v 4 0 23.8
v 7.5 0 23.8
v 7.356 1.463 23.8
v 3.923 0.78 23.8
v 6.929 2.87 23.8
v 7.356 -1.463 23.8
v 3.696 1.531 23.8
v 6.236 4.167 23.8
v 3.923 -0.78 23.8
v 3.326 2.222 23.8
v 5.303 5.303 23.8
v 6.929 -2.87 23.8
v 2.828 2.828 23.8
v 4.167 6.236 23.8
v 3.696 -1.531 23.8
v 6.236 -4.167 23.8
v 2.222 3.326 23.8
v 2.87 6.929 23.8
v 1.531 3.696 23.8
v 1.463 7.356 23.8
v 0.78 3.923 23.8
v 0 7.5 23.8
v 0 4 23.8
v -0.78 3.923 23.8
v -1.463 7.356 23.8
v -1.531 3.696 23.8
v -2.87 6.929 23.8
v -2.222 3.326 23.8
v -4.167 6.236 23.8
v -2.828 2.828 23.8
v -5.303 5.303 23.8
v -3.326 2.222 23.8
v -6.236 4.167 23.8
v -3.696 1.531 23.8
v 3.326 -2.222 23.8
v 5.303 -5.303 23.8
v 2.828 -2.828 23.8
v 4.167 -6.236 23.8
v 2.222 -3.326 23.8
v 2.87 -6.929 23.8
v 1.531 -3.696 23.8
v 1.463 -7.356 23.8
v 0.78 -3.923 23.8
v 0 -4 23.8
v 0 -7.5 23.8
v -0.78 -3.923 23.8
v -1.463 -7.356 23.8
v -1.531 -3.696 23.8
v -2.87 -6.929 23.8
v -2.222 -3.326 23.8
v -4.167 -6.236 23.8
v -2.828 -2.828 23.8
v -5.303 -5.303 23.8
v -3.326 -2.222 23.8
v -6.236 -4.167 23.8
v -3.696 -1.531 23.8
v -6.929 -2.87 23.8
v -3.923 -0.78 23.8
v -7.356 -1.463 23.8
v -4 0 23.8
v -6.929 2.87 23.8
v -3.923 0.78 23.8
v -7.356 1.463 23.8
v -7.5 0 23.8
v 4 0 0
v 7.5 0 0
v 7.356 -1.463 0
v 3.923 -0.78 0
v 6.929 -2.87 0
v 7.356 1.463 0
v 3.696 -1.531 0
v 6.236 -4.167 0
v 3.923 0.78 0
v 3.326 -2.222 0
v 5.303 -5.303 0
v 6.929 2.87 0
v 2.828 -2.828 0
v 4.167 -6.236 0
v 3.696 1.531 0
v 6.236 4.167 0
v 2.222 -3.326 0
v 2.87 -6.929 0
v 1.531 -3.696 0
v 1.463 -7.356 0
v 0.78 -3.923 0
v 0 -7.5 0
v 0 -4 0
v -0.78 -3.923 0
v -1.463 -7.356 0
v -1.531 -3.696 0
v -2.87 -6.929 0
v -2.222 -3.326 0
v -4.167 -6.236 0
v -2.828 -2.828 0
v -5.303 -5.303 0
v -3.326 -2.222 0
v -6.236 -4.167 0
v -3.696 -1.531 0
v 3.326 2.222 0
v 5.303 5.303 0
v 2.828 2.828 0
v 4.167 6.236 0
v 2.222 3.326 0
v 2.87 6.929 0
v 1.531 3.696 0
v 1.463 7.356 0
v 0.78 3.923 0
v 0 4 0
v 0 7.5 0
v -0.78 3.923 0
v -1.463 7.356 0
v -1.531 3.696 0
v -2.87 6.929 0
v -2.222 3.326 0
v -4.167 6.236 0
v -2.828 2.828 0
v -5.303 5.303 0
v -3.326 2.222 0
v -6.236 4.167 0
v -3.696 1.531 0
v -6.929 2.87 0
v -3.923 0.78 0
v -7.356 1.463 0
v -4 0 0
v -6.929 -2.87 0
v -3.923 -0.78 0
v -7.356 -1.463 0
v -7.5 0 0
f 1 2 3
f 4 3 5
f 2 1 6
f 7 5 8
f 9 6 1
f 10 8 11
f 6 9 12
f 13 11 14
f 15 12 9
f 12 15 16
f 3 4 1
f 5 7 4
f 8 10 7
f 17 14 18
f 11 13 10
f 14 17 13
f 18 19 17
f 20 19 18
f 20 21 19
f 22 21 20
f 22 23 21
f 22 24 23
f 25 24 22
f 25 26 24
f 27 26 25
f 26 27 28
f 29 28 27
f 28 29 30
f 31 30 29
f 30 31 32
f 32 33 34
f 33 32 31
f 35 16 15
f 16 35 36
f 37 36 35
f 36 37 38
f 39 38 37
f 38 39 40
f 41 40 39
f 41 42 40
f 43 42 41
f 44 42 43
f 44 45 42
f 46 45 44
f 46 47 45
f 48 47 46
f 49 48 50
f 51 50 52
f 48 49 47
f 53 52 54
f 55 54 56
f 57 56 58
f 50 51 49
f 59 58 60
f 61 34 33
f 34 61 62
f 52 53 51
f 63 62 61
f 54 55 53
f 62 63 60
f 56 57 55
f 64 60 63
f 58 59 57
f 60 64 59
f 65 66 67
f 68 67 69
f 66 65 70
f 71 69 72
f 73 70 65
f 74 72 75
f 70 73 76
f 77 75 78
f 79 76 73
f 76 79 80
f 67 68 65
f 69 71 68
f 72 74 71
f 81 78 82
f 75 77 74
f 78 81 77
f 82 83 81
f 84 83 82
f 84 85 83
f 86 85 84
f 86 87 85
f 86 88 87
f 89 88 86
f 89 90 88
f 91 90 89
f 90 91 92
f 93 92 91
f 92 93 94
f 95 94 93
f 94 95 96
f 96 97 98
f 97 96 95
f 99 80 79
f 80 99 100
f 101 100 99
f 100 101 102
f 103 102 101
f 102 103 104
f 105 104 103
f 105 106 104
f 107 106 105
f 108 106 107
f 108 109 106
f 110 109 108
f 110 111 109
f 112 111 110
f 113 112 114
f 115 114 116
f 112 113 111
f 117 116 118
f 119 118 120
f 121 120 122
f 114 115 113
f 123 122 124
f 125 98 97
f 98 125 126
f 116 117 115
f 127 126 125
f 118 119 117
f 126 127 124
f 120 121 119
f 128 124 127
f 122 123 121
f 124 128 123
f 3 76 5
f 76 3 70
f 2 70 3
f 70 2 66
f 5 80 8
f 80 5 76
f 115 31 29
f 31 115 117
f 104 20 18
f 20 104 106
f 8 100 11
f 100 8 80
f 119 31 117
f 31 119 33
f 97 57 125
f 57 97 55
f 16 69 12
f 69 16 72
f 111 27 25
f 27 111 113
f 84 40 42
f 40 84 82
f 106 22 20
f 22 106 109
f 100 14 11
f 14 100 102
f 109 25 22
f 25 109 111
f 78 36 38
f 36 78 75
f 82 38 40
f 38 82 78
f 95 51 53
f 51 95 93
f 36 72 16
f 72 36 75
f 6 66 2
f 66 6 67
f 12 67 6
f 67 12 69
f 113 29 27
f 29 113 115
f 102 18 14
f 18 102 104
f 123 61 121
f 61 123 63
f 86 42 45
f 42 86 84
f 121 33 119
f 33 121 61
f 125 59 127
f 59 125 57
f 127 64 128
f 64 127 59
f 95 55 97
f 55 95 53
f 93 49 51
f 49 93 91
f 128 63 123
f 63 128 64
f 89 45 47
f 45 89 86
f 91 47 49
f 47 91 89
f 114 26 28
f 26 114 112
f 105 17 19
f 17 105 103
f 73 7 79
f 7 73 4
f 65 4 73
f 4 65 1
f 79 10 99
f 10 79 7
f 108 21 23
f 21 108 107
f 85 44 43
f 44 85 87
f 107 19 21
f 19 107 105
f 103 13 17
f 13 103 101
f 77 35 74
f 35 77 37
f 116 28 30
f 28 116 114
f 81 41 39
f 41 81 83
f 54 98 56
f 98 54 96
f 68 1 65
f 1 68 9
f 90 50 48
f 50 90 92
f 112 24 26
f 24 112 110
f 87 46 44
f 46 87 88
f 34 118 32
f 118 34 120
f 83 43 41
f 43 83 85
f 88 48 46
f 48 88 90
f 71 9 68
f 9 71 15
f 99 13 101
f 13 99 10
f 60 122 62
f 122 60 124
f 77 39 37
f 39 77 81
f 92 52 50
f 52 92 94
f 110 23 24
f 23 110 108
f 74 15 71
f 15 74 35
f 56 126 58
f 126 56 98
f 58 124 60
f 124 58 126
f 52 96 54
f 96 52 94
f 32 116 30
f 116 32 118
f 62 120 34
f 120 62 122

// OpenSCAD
$fn=32;

lm8uu_length = 24;
lm8uu_id=5.2;
lm8uu_od=15.0;

id_clearance = 1;

n = 5;

layer_height = 0.2;

difference() {
	cylinder(r=lm8uu_od / 2, h=lm8uu_length - layer_height);
	difference() {
		cylinder(r=lm8uu_id / 2 + id_clearance, h=lm8uu_length - layer_height);
		linear_extrude(height = lm8uu_length - layer_height, twist = 540 / n, slices = (lm8uu_length - layer_height))
			for (i=[0:360/n]) {
				rotate(360 / n * i)
					translate([lm8uu_id / 2 / sqrt(2), lm8uu_id / 2 / sqrt(2)])
						square([lm8uu_id, lm8uu_id]);
			}
	}
	translate([0, 0, -1 + layer_height])
		cylinder(r1=lm8uu_id / 2 + id_clearance + 1, r2=0, h=lm8uu_id / 2 + id_clearance + 1);
	translate([0, 0, lm8uu_length - layer_height * 2 - (lm8uu_id / 2 + id_clearance)])
		cylinder(r2=lm8uu_id / 2 + id_clearance + 1, r1=0, h=lm8uu_id / 2 + id_clearance + 1);
	translate([0, 0, -1])
		cylinder(r=4.0, h=lm8uu_length + 2);
}
